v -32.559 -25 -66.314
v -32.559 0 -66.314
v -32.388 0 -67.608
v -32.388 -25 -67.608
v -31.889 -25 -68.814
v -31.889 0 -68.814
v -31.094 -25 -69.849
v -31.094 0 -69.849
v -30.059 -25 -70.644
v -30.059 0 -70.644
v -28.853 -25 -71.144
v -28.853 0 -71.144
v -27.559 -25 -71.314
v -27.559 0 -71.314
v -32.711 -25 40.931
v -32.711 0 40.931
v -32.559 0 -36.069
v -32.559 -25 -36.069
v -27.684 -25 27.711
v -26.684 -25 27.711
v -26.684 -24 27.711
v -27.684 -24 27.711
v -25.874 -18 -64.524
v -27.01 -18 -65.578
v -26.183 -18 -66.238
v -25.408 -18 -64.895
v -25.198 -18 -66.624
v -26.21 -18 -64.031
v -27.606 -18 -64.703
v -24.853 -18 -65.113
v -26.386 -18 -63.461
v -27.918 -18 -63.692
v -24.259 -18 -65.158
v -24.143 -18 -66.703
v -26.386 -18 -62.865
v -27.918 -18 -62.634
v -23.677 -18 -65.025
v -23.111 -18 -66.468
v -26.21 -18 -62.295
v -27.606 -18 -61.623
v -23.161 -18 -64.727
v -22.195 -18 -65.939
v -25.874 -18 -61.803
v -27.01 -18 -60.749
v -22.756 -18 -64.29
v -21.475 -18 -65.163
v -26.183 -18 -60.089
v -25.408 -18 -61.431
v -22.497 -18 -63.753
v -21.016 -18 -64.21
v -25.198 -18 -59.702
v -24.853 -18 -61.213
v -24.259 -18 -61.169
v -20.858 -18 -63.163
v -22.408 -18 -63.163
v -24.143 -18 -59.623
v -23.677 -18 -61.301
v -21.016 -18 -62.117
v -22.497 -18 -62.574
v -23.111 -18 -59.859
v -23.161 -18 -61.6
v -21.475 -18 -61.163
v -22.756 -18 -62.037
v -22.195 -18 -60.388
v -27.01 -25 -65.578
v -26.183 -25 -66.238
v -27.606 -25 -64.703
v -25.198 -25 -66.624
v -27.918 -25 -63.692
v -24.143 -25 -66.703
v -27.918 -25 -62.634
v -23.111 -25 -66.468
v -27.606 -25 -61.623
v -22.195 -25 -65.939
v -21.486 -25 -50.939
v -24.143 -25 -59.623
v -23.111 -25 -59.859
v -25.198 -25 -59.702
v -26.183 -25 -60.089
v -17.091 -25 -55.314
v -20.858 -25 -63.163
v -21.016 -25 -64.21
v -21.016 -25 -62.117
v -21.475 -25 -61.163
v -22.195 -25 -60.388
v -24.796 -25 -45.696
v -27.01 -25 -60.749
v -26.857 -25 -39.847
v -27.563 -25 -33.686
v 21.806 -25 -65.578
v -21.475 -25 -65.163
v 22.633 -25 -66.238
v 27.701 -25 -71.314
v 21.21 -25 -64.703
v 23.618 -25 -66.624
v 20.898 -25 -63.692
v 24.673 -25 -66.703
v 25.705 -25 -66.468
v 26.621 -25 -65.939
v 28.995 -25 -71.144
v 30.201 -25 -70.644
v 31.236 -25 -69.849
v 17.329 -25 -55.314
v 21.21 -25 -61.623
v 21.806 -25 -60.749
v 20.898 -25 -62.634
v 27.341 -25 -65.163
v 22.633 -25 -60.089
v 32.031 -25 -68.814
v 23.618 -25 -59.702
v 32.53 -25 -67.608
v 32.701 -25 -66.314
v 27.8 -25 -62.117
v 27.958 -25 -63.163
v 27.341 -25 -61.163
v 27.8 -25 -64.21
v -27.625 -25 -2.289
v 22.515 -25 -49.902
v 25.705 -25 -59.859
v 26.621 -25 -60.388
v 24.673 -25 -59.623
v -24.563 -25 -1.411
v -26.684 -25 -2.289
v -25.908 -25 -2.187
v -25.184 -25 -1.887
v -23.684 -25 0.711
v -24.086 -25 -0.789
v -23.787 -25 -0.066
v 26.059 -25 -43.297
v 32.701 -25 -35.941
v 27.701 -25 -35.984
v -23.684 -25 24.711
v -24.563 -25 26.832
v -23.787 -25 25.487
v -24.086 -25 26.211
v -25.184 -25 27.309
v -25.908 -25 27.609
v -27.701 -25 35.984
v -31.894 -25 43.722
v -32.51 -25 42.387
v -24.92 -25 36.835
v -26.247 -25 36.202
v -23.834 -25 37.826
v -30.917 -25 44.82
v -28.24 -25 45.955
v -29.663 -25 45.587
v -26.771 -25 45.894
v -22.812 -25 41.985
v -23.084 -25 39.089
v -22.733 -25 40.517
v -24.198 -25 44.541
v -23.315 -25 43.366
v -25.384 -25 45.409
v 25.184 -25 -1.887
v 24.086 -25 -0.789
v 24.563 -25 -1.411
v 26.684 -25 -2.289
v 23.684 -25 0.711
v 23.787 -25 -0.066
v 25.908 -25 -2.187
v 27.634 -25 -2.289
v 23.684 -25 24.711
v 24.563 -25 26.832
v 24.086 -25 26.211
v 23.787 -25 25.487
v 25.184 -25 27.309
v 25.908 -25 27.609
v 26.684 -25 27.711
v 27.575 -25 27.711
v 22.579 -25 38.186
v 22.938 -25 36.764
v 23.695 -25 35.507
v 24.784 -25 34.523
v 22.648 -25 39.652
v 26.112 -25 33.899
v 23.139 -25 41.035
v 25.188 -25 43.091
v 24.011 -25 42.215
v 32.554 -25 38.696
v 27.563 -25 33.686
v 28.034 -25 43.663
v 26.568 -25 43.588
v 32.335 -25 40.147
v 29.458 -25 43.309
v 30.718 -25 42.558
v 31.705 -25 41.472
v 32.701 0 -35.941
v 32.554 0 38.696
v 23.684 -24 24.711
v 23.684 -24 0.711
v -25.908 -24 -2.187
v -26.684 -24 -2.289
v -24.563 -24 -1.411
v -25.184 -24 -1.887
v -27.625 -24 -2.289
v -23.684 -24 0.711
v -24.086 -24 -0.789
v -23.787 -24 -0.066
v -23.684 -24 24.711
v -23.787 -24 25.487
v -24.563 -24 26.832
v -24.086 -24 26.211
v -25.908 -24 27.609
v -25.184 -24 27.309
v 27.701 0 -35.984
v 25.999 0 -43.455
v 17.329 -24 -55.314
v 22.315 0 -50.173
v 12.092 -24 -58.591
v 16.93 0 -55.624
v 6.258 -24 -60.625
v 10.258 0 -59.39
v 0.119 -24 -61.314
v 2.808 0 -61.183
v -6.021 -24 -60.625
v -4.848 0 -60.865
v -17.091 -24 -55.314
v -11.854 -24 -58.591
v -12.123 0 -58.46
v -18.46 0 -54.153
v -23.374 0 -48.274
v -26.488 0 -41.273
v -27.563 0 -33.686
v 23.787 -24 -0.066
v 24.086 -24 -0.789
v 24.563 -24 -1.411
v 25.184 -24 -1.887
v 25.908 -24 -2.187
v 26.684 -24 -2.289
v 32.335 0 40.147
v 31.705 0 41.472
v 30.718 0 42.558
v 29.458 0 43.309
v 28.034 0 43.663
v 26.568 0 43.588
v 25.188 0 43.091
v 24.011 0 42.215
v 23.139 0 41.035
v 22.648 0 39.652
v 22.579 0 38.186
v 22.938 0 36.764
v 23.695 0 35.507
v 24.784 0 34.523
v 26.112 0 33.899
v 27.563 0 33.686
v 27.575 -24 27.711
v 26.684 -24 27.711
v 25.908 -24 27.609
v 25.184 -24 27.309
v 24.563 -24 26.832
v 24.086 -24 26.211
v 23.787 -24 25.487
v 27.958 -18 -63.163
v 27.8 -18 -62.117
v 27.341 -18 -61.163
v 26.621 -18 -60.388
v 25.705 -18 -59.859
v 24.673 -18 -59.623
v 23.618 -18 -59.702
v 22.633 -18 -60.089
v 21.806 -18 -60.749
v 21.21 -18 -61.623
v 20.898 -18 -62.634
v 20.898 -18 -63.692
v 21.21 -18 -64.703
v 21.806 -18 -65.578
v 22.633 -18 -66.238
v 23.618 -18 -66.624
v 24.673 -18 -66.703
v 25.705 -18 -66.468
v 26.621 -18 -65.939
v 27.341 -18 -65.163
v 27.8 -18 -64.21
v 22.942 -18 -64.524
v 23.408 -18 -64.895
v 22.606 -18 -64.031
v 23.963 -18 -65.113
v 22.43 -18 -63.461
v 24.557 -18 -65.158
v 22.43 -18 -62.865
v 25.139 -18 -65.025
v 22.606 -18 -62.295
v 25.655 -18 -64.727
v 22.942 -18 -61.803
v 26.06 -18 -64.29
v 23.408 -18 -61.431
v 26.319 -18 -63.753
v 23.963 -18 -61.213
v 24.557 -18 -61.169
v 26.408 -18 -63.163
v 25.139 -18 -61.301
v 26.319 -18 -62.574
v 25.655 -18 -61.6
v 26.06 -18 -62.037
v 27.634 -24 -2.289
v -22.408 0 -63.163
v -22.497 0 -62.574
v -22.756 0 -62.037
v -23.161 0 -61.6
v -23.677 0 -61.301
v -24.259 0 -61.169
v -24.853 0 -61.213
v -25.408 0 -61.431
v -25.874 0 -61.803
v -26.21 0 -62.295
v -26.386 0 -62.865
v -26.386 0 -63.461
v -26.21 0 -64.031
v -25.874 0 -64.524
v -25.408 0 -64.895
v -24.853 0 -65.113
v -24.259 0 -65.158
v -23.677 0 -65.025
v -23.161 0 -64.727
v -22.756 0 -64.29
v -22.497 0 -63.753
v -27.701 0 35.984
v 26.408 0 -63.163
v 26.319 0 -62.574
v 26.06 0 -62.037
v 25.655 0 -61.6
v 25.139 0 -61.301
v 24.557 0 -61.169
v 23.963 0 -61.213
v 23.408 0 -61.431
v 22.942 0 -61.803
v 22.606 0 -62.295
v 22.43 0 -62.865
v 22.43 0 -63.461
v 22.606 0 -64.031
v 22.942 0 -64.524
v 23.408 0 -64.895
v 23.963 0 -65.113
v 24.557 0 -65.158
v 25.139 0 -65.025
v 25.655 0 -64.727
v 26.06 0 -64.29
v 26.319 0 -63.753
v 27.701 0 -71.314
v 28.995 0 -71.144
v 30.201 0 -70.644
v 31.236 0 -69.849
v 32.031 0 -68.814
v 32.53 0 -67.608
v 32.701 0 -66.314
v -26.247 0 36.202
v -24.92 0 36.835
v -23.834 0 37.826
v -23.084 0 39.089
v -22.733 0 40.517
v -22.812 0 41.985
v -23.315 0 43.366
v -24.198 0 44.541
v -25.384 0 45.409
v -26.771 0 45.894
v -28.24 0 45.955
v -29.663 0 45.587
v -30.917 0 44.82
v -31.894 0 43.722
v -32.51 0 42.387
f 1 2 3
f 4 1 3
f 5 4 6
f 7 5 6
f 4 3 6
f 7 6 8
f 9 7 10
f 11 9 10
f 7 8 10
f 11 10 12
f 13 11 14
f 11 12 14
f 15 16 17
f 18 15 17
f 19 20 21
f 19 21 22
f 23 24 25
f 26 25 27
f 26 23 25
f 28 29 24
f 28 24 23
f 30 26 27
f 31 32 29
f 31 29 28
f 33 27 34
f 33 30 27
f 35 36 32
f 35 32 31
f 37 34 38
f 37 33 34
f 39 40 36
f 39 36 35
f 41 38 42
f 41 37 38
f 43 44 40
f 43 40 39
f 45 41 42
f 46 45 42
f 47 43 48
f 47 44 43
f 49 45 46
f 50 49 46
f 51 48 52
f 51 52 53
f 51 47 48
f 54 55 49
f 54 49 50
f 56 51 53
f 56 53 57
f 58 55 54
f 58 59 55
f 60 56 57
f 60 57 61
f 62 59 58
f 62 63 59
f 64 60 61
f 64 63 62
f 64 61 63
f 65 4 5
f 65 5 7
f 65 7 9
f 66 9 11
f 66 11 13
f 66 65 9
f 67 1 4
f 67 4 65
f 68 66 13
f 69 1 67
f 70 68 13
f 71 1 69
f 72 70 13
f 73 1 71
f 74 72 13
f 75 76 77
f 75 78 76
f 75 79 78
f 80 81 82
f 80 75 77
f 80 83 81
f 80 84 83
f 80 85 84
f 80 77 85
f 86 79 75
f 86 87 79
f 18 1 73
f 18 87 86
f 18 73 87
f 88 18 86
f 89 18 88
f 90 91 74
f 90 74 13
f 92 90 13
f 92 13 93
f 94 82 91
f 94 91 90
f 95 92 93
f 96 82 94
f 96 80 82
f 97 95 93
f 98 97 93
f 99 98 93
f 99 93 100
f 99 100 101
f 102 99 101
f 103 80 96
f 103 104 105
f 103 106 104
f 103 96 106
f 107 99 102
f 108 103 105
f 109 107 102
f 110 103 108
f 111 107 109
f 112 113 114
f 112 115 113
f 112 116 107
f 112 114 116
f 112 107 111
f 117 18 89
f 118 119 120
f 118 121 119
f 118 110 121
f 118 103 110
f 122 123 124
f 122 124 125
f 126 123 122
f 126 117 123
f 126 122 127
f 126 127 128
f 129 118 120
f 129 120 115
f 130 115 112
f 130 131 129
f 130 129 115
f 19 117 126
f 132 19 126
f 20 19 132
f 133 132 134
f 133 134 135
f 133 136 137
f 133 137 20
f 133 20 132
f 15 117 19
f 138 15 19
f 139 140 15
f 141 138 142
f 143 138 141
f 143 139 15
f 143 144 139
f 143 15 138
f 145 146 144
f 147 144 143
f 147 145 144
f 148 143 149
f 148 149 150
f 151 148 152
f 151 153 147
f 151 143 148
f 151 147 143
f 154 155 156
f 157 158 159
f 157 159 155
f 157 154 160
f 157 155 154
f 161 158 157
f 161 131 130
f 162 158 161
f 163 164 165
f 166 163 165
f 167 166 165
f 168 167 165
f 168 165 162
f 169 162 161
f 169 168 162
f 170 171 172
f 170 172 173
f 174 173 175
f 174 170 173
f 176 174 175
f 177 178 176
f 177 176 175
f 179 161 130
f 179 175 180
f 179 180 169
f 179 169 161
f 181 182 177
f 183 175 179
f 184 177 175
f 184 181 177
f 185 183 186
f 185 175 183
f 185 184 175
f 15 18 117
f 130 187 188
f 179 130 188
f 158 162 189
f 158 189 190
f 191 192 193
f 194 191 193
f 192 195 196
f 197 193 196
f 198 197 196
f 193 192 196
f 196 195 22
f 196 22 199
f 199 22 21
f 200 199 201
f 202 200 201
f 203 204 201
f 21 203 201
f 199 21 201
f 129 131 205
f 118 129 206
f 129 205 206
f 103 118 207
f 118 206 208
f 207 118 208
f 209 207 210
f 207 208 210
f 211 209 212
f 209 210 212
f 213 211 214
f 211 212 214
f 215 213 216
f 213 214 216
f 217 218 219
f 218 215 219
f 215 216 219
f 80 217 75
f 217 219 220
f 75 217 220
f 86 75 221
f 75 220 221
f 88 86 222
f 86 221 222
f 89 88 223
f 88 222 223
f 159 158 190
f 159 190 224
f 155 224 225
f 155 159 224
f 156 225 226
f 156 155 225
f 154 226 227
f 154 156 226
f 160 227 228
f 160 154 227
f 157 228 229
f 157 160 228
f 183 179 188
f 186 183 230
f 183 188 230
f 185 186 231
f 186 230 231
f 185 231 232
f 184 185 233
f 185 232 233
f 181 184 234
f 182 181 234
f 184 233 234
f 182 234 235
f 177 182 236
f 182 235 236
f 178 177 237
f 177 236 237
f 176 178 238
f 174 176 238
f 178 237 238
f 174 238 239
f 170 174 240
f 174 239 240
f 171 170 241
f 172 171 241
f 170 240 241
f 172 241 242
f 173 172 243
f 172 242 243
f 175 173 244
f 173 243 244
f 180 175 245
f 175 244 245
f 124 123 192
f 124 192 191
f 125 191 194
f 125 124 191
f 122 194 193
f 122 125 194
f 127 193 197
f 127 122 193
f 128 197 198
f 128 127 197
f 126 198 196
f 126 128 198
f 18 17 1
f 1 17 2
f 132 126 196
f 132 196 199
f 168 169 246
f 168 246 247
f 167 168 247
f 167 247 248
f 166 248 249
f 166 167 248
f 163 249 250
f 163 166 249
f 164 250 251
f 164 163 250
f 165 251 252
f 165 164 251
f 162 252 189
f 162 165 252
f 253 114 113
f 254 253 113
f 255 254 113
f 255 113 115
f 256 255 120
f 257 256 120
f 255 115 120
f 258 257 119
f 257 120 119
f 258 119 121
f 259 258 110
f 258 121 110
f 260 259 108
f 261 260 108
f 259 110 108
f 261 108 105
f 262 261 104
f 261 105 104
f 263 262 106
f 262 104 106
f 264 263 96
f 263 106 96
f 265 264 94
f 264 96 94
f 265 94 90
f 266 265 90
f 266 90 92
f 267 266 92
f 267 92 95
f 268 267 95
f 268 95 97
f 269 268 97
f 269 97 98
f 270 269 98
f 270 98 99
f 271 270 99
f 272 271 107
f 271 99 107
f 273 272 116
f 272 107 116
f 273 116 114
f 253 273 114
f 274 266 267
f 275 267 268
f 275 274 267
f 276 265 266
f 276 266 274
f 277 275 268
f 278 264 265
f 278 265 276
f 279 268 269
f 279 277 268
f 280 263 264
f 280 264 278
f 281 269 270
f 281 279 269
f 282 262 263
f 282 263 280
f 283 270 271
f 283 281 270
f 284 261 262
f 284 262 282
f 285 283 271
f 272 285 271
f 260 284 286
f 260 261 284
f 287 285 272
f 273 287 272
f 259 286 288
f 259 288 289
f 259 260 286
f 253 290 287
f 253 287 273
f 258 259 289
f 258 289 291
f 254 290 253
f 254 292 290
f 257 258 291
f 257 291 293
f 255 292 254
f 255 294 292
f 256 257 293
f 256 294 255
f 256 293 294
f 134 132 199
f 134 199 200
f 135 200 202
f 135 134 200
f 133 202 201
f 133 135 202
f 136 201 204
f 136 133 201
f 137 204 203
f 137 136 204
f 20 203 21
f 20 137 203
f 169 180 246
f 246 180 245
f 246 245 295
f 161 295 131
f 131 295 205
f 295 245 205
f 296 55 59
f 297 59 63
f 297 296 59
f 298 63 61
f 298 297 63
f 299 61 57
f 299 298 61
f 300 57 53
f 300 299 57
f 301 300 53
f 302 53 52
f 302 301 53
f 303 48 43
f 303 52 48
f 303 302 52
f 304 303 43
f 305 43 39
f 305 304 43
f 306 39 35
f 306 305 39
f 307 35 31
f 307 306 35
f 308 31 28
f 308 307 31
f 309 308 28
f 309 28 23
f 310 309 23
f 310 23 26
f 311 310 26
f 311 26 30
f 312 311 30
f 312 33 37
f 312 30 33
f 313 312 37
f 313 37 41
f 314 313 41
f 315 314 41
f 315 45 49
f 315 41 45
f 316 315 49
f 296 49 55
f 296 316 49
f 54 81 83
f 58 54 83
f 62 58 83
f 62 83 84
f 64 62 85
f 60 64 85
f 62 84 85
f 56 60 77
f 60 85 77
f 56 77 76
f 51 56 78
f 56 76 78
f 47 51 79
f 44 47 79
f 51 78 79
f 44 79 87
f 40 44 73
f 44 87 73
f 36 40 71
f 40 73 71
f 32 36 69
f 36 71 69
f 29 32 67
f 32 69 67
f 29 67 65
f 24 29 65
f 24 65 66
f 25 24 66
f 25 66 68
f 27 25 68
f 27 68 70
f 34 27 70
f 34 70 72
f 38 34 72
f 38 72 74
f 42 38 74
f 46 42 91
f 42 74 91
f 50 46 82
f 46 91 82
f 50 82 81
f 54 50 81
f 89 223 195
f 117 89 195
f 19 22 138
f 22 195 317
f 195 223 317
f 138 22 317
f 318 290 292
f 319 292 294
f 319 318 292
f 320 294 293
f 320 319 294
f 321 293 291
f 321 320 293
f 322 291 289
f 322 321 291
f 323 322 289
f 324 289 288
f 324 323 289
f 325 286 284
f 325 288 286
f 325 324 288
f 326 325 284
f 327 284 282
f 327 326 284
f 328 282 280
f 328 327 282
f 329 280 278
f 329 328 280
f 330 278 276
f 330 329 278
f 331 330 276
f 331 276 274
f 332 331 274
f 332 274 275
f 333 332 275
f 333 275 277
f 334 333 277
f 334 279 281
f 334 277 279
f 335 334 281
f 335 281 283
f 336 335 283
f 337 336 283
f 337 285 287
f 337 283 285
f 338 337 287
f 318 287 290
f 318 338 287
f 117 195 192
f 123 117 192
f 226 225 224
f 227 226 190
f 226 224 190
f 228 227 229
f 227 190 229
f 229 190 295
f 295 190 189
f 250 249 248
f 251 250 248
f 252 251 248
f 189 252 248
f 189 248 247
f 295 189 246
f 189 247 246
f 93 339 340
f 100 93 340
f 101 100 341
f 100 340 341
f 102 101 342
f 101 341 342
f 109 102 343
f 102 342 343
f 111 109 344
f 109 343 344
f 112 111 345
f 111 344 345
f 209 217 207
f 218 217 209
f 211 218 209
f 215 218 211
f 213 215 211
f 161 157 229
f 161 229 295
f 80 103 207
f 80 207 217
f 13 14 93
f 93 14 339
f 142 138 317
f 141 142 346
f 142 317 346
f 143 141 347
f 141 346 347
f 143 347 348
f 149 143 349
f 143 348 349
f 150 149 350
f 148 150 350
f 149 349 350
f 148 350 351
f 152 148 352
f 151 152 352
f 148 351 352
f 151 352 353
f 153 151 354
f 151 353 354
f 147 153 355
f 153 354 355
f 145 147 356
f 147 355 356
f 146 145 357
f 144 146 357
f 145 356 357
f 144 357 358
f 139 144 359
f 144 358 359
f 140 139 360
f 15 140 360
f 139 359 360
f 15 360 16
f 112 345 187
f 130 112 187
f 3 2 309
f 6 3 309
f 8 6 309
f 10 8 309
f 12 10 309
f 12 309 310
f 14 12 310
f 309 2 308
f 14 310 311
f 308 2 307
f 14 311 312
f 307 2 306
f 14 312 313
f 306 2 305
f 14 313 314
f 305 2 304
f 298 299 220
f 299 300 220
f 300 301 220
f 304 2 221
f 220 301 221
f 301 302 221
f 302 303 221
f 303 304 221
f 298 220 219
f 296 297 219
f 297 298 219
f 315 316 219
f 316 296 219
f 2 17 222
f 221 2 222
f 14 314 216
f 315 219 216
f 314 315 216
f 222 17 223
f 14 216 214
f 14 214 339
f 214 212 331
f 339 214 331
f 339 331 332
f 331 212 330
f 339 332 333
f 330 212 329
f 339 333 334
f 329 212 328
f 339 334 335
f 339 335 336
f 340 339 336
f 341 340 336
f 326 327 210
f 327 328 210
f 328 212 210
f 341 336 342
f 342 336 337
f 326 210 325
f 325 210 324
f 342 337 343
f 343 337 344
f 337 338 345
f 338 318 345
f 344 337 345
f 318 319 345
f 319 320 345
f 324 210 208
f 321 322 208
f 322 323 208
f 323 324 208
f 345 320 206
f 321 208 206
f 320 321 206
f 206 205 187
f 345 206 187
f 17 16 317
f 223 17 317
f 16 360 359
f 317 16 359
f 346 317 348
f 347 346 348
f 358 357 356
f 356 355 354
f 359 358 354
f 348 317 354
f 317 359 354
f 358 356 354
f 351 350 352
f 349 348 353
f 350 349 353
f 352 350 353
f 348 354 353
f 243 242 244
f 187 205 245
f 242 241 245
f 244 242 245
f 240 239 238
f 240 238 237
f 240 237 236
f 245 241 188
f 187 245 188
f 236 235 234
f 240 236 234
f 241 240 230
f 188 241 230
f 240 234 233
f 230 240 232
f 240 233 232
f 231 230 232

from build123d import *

# Parameters (mm, degrees)
F0_R     = 2
F1_DEPTH = 25
F3_DEPTH = 1
F4_R     = 3.55
F5_DEPTH = 7


with BuildPart() as f1:
    # F0 (on Front) → F1 (new body)
    with BuildSketch(Plane.XZ):
        with BuildLine():
            Line((27.5634530751, 33.6863230431), (27.700783795, -35.983503393))
            ThreePointArc((27.700783795, -35.983503393), (-1.0310012543, -61.2900569115), (-27.5634530751, -33.6863230431))
            Line((-27.5634530751, -33.6863230431), (-27.700783795, 35.983503393))
            ThreePointArc((-27.700783795, 35.983503393), (-24.1975782347, 44.5411756868), (-32.7105452322, 40.9306913446))
            Line((-32.7105452322, 40.9306913446), (-32.5587658259, -36.0691590645))
            Line((-32.5587658259, -36.0691590645), (-32.5587658259, -66.3139410643))
            ThreePointArc((-32.5587658259, -66.3139410643), (-31.0942997319, -69.8494749702), (-27.5587658259, -71.3139410643))
            Line((-27.5587658259, -71.3139410643), (27.700708785, -71.3139410643))
            ThreePointArc((27.700708785, -71.3139410643), (31.236242691, -69.8494749702), (32.700708785, -66.3139410643))
            Line((32.700708785, -66.3139410643), (32.700708785, -35.9405218755))
            Line((32.700708785, -35.9405218755), (32.5535875558, 38.696169135))
            ThreePointArc((32.5535875558, 38.696169135), (24.0111011252, 42.2148712597), (27.5634530751, 33.6863230431))
        make_face()
        with Locations((-24.4080040093, -63.1631792477)):
            Circle(F0_R, mode=Mode.SUBTRACT)
        with Locations((24.4080040093, -63.1631792477)):
            Circle(F0_R, mode=Mode.SUBTRACT)
    extrude(amount=F1_DEPTH)

    # F2 (on face) → F3 (join)
    with BuildSketch(Plane.XZ.offset(25)):
        with BuildLine():
            Line((-26.6844767994, 27.7107327074), (-27.6844767994, 27.7107327074))
            Line((-27.6844767994, 27.7107327074), (-27.6844767994, -2.2892672926))
            Line((-27.6844767994, -2.2892672926), (-26.6844767994, -2.2892672926))
            ThreePointArc((-26.6844767994, -2.2892672926), (-24.5631564558, -1.4105876361), (-23.6844767994, 0.7107327074))
            Line((-23.6844767994, 0.7107327074), (-23.6844767994, 24.7107327074))
            ThreePointArc((-23.6844767994, 24.7107327074), (-24.5631564558, 26.832053051), (-26.6844767994, 27.7107327074))
        make_face()
        with BuildLine():
            Line((26.6844767994, -2.2892672926), (27.6844767994, -2.2892672926))
            Line((27.6844767994, -2.2892672926), (27.6844767994, 27.7107327074))
            Line((27.6844767994, 27.7107327074), (26.6844767994, 27.7107327074))
            ThreePointArc((26.6844767994, 27.7107327074), (24.5631564558, 26.832053051), (23.6844767994, 24.7107327074))
            Line((23.6844767994, 24.7107327074), (23.6844767994, 0.7107327074))
            ThreePointArc((23.6844767994, 0.7107327074), (24.5631564558, -1.4105876361), (26.6844767994, -2.2892672926))
        make_face()
        with BuildLine():
            Line((0.1186772118, -55.3139410643), (-17.0913840546, -55.3139410643))
            ThreePointArc((-17.0913840546, -55.3139410643), (-8.994310893, -59.7709375988), (0.1186772118, -61.3139410643))
            Line((0.1186772118, -61.3139410643), (0.1186772118, -55.3139410643))
        make_face()
        with BuildLine():
            Line((17.3287384782, -55.3139410643), (0.1186772118, -55.3139410643))
            Line((0.1186772118, -55.3139410643), (0.1186772118, -61.3139410643))
            ThreePointArc((0.1186772118, -61.3139410643), (9.2316653166, -59.7709375988), (17.3287384782, -55.3139410643))
        make_face()
    extrude(amount=-F3_DEPTH)

    # F4 (on face) → F5 (cut)
    with BuildSketch(Plane.XZ.offset(25)):
        with Locations((-24.4080040093, -63.1631792477)):
            Circle(F4_R)
        with Locations((24.4080040093, -63.1631792477)):
            Circle(F4_R)
    extrude(amount=-F5_DEPTH, mode=Mode.SUBTRACT)


solid = f1.part
